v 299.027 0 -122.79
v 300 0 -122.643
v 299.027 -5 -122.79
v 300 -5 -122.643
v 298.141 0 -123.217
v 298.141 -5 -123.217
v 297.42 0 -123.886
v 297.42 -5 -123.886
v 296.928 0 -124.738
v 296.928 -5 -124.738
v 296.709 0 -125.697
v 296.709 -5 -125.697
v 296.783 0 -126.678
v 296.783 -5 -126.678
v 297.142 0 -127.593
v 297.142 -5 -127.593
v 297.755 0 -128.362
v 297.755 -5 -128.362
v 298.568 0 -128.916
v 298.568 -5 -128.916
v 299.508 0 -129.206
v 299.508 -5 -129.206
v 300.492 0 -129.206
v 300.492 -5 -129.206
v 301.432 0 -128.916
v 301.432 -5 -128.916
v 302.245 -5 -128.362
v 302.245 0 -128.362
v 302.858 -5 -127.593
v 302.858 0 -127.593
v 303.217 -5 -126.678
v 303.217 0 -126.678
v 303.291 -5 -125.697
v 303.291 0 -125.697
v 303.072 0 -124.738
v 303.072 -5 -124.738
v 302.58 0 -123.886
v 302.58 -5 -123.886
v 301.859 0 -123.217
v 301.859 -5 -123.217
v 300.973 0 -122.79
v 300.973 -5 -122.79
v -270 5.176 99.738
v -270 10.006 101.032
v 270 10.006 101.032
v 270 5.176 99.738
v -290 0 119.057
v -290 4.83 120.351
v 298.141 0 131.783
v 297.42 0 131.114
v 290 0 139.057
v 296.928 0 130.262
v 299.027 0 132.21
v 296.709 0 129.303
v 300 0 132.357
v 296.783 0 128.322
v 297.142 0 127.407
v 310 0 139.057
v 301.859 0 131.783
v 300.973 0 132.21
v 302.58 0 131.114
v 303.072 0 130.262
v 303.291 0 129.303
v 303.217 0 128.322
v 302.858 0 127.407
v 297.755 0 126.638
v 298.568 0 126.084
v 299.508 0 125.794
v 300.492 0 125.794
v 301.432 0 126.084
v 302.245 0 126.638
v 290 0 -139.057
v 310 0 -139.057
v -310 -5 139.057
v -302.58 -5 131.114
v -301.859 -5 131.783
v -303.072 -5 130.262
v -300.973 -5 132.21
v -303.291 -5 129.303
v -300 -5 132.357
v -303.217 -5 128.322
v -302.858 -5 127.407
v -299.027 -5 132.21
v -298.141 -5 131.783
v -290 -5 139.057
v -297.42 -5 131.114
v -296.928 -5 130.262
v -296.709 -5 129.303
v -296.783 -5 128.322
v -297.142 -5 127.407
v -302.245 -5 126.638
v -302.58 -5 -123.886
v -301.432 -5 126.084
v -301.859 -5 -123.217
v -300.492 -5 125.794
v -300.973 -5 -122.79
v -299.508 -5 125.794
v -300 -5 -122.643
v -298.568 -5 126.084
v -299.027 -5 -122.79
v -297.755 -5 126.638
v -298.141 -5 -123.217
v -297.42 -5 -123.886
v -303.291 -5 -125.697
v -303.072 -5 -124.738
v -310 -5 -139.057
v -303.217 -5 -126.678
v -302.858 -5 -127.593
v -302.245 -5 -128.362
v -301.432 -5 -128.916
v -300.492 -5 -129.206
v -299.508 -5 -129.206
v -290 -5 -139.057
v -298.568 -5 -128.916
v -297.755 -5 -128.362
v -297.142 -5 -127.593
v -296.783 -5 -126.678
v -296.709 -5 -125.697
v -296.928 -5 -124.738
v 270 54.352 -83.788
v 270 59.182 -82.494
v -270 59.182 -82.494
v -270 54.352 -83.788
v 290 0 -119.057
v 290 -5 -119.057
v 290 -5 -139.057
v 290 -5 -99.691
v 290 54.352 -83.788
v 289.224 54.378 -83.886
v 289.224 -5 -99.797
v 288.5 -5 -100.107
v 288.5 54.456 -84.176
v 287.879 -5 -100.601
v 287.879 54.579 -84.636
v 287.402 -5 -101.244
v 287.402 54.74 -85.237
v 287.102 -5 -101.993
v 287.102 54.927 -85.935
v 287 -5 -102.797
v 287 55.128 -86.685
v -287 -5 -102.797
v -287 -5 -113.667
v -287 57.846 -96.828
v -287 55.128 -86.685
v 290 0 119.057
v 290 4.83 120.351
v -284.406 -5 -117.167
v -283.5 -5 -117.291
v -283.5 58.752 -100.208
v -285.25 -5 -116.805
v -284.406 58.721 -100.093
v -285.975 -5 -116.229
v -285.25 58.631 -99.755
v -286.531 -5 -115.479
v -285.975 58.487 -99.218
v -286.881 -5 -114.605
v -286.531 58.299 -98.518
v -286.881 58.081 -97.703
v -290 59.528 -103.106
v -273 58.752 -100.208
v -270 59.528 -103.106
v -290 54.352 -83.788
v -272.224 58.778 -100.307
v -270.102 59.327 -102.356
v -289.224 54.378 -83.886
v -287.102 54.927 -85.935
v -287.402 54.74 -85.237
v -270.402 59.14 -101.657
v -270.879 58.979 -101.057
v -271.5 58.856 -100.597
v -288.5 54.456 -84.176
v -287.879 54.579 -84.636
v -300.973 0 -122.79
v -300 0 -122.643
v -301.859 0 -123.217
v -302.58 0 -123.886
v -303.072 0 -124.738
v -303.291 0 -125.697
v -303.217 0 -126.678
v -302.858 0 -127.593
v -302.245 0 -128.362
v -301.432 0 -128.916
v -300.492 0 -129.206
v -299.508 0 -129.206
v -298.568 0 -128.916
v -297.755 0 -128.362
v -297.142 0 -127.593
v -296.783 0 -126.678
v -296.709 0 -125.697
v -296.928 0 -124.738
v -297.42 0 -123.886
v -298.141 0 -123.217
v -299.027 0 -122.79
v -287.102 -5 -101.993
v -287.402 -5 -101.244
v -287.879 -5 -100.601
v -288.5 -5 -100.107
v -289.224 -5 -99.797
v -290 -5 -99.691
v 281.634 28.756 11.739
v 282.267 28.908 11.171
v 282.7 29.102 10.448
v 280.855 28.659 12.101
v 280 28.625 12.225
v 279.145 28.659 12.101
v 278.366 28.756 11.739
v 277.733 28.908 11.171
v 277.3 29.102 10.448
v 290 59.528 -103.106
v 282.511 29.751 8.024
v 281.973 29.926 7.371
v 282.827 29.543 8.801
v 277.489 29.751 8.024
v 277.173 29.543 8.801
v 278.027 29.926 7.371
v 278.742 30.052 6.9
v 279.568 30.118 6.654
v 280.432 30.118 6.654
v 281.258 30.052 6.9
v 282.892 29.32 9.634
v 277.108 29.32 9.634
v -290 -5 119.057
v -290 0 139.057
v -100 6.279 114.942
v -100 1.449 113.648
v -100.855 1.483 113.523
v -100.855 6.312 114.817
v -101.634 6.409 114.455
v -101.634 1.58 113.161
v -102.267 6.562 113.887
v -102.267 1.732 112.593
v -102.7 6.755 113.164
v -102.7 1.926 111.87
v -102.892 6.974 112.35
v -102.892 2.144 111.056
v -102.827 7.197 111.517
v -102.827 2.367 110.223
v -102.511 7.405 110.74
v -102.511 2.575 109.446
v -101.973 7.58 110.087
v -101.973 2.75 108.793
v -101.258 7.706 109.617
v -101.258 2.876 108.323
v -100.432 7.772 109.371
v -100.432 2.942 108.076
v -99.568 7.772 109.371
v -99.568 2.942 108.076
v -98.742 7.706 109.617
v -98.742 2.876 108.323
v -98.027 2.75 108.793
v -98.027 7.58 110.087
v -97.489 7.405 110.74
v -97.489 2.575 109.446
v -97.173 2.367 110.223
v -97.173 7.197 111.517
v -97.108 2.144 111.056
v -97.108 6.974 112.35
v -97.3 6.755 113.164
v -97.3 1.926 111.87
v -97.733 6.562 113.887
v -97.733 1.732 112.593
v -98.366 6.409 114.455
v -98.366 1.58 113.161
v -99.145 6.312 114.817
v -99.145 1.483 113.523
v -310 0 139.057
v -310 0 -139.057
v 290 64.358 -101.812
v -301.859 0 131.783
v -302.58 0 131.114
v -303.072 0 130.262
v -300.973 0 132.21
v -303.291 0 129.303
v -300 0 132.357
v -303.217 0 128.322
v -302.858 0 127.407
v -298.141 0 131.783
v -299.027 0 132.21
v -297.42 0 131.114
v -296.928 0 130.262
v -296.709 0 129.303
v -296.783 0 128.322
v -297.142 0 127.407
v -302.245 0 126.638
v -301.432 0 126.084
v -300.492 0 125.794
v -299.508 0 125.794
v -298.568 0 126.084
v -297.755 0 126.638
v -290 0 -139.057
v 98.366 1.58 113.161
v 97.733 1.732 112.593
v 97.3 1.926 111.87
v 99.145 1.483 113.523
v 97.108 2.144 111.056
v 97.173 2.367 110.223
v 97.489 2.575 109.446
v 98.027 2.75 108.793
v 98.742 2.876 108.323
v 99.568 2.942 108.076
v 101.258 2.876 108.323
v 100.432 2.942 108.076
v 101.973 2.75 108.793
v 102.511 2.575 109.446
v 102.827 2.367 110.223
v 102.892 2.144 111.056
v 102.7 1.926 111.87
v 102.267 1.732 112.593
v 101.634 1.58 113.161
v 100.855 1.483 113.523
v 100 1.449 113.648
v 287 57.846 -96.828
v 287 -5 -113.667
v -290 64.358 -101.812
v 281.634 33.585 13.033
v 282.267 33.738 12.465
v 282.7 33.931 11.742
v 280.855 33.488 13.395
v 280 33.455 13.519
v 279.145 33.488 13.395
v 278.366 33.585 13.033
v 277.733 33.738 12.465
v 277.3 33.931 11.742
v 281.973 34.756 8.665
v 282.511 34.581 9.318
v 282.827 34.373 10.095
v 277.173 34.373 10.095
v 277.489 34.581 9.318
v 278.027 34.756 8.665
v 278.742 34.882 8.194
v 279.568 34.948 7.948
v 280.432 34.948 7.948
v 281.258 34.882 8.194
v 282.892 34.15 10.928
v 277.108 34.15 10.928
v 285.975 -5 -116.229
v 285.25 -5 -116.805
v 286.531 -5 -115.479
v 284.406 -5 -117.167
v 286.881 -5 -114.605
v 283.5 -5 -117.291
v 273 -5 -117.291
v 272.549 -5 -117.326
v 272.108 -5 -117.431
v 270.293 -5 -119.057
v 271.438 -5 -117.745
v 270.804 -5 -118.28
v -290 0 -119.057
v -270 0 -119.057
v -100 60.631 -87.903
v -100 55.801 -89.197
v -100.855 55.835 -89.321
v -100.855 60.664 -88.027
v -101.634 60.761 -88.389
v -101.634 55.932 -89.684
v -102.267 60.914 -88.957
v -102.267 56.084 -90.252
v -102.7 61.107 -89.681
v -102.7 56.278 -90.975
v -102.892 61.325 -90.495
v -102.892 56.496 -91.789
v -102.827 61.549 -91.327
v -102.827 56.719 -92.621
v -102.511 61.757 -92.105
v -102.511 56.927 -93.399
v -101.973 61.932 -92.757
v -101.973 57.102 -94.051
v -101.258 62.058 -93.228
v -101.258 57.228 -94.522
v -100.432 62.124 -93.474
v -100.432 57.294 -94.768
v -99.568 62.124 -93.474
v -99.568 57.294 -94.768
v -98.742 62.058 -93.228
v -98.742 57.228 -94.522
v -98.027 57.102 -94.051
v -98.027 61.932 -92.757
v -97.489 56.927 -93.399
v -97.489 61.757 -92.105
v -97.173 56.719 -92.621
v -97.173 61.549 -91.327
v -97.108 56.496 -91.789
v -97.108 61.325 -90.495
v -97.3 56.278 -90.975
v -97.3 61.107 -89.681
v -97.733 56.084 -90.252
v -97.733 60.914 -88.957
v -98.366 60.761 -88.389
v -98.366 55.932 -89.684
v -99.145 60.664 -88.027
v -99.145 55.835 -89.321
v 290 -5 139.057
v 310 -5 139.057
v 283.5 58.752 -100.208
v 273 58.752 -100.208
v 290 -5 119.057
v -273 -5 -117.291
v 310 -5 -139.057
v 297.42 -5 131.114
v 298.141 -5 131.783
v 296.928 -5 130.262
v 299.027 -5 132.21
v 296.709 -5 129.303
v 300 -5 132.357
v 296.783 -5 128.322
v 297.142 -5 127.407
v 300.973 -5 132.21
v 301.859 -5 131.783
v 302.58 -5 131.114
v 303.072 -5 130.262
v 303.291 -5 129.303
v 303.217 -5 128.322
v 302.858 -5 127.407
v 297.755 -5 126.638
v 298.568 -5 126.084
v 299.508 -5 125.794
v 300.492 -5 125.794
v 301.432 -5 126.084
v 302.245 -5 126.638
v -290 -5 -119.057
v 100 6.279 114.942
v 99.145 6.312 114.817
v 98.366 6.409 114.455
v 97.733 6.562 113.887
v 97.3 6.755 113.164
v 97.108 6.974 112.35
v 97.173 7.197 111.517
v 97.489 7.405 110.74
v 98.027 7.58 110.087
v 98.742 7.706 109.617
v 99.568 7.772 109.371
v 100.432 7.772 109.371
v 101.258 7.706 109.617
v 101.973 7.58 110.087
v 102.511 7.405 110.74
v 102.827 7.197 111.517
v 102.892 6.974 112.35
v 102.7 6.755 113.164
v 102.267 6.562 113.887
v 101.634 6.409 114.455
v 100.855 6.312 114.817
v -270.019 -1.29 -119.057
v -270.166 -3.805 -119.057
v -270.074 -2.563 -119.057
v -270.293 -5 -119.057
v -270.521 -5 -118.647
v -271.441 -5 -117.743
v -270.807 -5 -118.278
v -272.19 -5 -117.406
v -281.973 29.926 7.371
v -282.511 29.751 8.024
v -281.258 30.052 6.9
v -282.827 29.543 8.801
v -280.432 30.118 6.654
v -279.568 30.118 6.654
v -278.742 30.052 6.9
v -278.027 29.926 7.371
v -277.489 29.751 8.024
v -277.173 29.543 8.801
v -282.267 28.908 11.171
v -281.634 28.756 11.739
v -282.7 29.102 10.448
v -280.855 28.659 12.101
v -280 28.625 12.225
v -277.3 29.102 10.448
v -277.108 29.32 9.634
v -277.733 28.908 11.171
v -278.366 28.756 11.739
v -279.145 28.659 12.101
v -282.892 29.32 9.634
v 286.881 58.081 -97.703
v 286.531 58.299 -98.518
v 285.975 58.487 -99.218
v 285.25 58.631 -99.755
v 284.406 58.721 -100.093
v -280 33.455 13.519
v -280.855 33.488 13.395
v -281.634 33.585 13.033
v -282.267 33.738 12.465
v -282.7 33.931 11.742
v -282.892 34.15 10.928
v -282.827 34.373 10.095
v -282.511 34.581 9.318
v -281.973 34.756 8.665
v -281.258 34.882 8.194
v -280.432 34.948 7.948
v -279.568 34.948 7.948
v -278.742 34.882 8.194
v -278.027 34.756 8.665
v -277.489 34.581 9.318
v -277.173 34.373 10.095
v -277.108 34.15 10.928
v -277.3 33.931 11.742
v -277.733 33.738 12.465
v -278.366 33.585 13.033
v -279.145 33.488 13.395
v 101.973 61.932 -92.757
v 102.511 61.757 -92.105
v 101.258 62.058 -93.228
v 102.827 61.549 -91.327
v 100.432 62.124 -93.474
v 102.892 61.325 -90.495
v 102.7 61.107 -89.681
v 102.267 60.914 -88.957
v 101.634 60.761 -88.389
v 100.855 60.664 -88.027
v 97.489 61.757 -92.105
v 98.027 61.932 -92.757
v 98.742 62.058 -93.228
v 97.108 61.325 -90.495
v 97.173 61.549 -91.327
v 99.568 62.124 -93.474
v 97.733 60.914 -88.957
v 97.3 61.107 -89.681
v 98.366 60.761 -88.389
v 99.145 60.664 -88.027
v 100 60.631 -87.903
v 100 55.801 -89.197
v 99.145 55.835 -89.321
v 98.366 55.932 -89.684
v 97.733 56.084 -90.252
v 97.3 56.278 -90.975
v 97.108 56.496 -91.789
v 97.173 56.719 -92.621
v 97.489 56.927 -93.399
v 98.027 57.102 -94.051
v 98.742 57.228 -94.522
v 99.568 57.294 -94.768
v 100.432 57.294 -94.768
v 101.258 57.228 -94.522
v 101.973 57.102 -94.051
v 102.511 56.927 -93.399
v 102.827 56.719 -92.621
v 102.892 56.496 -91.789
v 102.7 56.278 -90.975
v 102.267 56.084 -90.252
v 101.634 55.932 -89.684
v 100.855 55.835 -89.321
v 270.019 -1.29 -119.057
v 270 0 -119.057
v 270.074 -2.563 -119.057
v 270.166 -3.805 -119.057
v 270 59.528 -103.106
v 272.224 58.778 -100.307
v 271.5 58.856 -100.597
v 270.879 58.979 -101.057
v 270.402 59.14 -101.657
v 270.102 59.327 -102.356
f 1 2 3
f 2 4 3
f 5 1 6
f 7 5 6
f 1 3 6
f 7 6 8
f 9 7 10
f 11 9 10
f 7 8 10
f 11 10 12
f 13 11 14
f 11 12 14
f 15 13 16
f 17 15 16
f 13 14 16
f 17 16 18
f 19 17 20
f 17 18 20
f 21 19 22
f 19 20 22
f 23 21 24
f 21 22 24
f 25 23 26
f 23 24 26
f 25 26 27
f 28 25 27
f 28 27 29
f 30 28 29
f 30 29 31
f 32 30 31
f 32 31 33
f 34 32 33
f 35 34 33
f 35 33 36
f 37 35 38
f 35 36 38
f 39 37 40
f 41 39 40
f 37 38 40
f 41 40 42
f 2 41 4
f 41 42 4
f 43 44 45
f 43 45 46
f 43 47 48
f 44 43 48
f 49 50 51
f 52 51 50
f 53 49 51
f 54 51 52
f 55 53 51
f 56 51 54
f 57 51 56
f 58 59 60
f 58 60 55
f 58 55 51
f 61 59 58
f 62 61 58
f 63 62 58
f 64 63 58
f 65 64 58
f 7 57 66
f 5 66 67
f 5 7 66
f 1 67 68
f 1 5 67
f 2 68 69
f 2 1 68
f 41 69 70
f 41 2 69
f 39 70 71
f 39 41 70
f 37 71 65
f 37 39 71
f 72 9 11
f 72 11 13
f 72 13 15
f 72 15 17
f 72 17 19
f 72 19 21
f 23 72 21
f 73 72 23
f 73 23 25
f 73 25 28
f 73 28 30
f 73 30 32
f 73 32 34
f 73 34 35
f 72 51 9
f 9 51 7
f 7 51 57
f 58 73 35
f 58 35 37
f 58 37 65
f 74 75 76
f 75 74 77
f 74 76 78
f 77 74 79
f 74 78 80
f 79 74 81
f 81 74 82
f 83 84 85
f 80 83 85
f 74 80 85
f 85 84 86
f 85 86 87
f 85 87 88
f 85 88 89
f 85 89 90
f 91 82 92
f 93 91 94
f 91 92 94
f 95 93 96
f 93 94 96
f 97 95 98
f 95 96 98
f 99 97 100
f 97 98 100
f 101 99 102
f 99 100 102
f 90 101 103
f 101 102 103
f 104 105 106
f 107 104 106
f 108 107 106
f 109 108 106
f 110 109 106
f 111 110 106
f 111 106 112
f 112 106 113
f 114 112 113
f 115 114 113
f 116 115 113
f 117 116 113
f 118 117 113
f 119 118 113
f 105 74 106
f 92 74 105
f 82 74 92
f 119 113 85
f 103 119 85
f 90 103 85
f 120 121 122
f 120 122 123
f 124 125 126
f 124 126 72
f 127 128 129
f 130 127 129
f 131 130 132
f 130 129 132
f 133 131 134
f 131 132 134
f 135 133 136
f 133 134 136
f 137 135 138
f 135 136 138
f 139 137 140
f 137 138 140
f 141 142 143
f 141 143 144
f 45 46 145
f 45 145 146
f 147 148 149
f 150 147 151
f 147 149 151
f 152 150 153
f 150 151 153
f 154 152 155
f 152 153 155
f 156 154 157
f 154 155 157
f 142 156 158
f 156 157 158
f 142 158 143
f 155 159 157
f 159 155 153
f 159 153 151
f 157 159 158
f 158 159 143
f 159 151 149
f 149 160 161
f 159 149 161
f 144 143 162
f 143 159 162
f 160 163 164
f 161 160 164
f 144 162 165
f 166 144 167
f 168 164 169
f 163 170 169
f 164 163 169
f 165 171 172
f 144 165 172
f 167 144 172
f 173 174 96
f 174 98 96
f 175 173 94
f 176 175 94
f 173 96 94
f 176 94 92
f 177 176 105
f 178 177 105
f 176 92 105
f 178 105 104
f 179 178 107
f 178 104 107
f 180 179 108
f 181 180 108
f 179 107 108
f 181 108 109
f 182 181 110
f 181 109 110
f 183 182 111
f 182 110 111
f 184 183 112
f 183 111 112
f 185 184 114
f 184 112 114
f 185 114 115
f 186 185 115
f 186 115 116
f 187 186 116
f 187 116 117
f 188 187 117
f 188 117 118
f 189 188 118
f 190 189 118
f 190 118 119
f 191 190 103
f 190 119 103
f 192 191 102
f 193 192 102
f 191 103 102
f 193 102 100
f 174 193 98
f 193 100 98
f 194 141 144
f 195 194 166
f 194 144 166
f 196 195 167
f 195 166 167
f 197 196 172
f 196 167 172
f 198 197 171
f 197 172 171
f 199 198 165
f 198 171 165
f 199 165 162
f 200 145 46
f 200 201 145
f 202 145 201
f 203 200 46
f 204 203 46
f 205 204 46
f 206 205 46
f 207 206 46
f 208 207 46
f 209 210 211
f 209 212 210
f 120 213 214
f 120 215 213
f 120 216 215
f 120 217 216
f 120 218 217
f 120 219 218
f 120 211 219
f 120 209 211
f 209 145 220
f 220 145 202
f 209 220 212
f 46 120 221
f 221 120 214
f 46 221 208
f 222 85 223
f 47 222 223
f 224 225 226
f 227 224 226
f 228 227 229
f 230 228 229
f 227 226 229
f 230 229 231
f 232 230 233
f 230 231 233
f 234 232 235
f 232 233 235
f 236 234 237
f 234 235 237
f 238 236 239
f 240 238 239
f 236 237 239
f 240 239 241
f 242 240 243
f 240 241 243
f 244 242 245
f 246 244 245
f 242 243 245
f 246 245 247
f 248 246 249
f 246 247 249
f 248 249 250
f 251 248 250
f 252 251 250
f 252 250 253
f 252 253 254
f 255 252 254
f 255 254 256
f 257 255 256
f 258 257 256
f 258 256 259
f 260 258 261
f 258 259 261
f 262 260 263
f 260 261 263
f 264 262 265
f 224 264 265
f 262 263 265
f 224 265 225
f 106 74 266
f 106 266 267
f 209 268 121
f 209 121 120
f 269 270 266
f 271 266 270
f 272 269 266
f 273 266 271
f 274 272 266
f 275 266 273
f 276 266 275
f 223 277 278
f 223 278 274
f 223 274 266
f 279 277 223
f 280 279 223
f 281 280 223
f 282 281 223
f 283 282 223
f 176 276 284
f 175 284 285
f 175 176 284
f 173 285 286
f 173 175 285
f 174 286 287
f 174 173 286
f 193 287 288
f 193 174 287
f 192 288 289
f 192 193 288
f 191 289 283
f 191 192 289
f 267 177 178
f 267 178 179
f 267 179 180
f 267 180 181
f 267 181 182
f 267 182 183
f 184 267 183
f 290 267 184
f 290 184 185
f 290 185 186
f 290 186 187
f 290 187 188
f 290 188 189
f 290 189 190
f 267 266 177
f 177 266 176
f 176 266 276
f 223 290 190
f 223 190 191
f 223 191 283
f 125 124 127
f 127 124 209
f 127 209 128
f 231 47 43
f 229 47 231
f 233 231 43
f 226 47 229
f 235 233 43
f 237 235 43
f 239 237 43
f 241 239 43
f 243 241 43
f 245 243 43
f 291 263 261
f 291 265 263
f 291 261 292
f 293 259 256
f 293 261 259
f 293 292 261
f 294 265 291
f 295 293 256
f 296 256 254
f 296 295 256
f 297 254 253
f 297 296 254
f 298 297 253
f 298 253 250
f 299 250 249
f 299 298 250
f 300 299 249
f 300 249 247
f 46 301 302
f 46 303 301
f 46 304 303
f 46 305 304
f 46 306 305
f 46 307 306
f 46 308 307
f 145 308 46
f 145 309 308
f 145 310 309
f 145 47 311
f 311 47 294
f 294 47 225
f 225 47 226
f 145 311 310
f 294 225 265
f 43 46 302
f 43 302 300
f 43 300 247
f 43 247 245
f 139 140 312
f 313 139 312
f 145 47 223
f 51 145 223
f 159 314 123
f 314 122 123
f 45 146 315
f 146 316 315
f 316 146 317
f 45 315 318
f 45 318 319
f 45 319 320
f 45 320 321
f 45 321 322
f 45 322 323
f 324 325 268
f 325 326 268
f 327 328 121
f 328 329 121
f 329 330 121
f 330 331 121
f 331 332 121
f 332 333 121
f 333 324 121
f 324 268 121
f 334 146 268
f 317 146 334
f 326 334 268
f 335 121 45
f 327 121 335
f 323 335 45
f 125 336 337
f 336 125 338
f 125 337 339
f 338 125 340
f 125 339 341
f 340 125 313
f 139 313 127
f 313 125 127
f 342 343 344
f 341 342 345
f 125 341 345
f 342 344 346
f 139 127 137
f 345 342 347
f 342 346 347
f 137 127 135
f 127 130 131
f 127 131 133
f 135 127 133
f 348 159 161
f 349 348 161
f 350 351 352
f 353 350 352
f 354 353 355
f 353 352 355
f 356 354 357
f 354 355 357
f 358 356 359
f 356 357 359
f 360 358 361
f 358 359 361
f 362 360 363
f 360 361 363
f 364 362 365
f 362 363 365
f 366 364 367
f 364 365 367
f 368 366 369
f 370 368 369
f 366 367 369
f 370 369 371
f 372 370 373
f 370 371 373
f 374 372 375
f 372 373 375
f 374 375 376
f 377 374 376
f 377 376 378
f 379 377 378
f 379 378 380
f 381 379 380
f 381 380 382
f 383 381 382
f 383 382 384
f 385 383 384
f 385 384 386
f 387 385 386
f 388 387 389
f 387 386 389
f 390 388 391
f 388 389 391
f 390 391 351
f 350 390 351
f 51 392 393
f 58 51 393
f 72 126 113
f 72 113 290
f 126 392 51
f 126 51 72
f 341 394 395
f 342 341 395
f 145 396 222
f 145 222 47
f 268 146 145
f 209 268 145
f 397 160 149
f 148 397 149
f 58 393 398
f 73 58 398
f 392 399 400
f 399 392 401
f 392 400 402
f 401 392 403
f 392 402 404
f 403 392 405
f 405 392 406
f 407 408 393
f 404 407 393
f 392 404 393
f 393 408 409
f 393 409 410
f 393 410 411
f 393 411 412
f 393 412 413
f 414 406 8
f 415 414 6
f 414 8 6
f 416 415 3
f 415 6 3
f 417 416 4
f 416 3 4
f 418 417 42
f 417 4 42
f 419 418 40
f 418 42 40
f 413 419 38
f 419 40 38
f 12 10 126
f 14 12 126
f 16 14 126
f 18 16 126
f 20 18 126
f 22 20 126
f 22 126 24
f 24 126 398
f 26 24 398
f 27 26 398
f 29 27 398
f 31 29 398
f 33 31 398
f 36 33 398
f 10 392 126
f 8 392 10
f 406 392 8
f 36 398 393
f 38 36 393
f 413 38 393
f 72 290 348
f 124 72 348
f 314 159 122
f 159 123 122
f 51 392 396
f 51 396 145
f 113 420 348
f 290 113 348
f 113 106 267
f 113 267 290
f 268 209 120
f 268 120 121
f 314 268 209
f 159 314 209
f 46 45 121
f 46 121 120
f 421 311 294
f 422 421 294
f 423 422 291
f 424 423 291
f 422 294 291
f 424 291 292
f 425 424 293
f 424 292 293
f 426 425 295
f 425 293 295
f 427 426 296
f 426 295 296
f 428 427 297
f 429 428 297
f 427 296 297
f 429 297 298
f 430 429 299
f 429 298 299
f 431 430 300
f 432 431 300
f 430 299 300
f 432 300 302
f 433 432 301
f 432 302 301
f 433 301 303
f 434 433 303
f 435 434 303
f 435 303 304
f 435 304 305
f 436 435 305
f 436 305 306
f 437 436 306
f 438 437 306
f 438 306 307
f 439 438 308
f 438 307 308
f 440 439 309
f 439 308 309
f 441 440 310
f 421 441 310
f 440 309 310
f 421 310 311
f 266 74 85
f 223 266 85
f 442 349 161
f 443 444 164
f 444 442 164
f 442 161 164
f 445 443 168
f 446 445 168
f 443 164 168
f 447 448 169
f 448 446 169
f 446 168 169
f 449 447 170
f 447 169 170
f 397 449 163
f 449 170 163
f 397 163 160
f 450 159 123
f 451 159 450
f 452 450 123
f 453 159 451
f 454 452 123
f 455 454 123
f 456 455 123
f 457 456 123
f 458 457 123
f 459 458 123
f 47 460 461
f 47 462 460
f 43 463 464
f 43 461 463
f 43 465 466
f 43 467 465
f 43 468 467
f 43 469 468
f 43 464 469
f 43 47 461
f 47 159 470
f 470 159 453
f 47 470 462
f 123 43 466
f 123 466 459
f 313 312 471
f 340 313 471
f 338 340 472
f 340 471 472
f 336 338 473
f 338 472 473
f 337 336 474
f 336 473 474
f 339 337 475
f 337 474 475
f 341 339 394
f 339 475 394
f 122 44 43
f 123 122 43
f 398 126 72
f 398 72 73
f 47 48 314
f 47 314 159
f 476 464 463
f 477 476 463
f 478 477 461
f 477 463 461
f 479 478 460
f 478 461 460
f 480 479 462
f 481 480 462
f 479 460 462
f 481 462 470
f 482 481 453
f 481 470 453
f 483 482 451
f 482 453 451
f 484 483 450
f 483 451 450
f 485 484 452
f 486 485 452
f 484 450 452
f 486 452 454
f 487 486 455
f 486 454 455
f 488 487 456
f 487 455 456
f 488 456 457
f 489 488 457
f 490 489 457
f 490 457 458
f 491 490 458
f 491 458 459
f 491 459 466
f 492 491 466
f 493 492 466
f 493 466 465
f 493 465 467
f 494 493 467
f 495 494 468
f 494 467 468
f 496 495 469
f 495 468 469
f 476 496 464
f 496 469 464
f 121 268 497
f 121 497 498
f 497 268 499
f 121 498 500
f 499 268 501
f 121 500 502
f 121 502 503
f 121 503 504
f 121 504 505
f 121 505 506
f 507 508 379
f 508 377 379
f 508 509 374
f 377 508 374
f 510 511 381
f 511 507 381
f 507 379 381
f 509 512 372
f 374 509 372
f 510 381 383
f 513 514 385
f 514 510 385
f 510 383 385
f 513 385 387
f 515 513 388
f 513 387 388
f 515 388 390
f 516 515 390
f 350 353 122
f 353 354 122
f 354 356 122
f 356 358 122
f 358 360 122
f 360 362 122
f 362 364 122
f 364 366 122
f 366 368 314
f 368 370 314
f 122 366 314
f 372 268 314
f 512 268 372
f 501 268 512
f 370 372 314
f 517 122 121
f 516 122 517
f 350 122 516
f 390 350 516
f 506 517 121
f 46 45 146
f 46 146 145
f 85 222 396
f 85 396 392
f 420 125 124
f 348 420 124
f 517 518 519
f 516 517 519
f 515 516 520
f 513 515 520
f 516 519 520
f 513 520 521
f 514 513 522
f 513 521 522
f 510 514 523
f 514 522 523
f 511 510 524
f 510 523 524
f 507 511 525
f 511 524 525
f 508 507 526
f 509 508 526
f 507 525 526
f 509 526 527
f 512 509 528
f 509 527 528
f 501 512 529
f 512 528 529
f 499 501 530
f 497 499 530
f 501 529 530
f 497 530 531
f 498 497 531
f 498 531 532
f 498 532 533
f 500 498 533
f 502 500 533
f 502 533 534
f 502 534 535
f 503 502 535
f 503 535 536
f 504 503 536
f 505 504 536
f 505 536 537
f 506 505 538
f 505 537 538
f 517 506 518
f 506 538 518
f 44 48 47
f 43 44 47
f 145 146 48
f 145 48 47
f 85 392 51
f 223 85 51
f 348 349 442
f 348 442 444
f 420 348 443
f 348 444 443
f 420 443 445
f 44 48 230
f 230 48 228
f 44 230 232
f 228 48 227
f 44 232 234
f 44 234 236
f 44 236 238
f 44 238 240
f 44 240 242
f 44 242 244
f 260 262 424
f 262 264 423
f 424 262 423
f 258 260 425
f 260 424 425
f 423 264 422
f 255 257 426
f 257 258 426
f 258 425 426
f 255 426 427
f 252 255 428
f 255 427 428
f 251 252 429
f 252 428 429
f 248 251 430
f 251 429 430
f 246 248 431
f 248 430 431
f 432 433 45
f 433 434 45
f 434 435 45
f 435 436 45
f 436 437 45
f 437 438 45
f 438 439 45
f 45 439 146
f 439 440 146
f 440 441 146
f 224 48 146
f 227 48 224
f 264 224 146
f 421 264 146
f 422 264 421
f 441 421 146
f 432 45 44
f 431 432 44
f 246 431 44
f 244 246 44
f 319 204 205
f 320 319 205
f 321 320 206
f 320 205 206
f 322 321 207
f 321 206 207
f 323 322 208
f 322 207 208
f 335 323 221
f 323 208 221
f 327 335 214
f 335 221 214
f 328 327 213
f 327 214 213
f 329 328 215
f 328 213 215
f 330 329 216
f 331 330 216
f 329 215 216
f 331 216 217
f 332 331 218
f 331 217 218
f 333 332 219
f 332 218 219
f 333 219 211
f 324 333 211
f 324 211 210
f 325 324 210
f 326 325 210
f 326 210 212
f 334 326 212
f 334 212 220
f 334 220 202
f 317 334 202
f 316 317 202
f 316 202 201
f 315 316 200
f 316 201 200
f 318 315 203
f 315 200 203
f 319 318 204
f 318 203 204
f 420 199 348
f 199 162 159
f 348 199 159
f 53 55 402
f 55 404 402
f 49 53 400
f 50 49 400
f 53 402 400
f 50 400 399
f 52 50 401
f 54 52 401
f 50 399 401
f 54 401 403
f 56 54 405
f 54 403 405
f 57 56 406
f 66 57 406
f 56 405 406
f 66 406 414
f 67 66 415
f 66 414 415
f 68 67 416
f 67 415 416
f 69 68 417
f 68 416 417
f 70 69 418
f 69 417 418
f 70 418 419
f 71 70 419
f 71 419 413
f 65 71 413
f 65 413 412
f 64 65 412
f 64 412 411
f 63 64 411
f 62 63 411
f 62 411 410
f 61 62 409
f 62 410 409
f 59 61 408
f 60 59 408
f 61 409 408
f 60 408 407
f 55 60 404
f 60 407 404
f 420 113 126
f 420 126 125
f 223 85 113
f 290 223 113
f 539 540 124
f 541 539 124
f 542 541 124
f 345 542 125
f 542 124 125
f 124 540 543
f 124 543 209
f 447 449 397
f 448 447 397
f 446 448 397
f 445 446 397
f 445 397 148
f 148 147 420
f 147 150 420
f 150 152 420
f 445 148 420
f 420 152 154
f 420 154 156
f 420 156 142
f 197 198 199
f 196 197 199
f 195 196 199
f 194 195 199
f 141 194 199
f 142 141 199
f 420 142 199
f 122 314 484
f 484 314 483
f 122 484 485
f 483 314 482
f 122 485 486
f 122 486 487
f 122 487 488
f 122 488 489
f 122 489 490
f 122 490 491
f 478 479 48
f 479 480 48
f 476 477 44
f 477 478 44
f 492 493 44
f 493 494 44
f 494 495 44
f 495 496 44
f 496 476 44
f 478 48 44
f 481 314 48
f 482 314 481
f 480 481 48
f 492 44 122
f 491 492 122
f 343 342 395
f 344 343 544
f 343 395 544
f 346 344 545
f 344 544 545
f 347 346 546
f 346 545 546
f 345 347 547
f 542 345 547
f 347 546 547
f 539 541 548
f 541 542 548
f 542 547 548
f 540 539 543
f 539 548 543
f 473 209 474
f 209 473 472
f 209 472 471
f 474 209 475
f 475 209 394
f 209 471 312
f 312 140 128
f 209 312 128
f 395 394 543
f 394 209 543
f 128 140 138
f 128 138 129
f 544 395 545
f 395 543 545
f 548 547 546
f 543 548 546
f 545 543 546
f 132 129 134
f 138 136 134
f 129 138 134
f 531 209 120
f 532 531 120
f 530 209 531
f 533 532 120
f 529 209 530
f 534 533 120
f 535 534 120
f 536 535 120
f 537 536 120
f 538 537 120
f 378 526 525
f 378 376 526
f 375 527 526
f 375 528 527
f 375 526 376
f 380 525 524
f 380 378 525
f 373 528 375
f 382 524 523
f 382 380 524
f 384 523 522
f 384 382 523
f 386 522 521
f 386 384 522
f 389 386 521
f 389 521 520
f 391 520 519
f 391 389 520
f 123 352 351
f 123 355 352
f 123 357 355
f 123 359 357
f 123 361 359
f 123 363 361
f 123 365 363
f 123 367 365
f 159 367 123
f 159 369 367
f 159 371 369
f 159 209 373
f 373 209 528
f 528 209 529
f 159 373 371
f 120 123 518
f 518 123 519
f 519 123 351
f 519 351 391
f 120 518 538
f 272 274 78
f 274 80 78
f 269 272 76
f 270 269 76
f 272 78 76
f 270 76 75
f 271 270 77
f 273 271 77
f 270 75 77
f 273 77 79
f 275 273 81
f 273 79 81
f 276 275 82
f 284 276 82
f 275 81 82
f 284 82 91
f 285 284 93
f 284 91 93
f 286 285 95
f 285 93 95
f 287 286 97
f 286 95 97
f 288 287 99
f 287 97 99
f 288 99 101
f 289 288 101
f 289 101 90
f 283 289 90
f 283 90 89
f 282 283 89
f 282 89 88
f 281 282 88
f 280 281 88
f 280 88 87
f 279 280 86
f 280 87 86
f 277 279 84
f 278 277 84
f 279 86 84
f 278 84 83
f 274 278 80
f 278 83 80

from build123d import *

# Parameters (mm, degrees)
TUBE_RECTANGULAR_50_X_30_X_2_6_46_DEPTH      = 251.615528128
TUBE_RECTANGULAR_50_X_30_X_2_6_46_DEPTH_BACK = 21.615528128
SKETCH1_W                                    = 20
SKETCH1_H                                    = 5
SKETCH1_ON_SEGMENT_2_W                       = 20
SKETCH1_ON_SEGMENT_2_H                       = 5
TUBE_RECTANGULAR_50_X_30_X_2_6_46_3_DEPTH    = 623.231056256
SKETCH1_ON_SEGMENT_3_W                       = 20
SKETCH1_ON_SEGMENT_3_H                       = 5
TUBE_RECTANGULAR_50_X_30_X_2_6_46_5_DEPTH    = 273.231056256
SKETCH1_ON_SEGMENT_4_W                       = 20
SKETCH1_ON_SEGMENT_4_H                       = 5
TUBE_RECTANGULAR_50_X_30_X_2_6_46_7_DEPTH    = 623.231056256
L_ANGLE_EQUAL_20X20X3_13_DEPTH               = 61.628314259
L_ANGLE_EQUAL_20X20X3_13_2_DEPTH             = 61.628314259
TUBE_START                                   = -5
TUBE_RECTANGULAR_50_X_30_X_2_6_47_OUTL_W     = 20
TUBE_RECTANGULAR_50_X_30_X_2_6_47_OUTL_H     = 278.113521494
TUBE_RECTANGULAR_50_X_30_X_2_6_47_DEPTH      = 5
TUBE_START_2                                 = -290
TUBE_RECTANGULAR_50_X_30_X_2_6_47_2_OU_W     = 5
TUBE_RECTANGULAR_50_X_30_X_2_6_47_2_OU_H     = 20
TUBE_RECTANGULAR_50_X_30_X_2_6_47_2_DEPTH    = 580
TUBE_RECTANGULAR_50_X_30_X_2_6_47_3_OU_W     = 5
TUBE_RECTANGULAR_50_X_30_X_2_6_47_3_OU_H     = 20
TUBE_RECTANGULAR_50_X_30_X_2_6_47_3_DEPTH    = 580
TUBE_RECTANGULAR_50_X_30_X_2_6_47_4_OU_W     = 20
TUBE_RECTANGULAR_50_X_30_X_2_6_47_4_OU_H     = 278.113521494
TUBE_RECTANGULAR_50_X_30_X_2_6_47_4_DEPTH    = 5
BODY_START                                   = 61.628314241
BODY_5_RUN_ON_DEPTH                          = 5.176381
BODY_START_2                                 = 61.62831424
BODY_6_RUN_ON_DEPTH                          = 5.176381
SKETCH20_W                                   = 3.3
SKETCH20_H                                   = 5
M6_CLEARANCE_HOLE1_AT_2_COUNT                = 2
M6_CLEARANCE_HOLE1_AT_2_PITCH                = 255
M6_CLEARANCE_HOLE1_AT_3_COUNT                = 2
M6_CLEARANCE_HOLE1_AT_3_PITCH                = 651.939414363
M6_CLEARANCE_HOLE1_AT_4_COUNT                = 2
M6_CLEARANCE_HOLE1_AT_4_PITCH                = 600
ESQUISSE2_W                                  = 2.9
ESQUISSE2_H                                  = 76.634324293
D_GAGEMENT_M51_AT_2_COUNT                    = 2
D_GAGEMENT_M51_AT_2_PITCH                    = 290
D_GAGEMENT_M51_AT_3_COUNT                    = 2
D_GAGEMENT_M51_AT_3_PITCH                    = 210
D_GAGEMENT_M51_AT_4_COUNT                    = 2
D_GAGEMENT_M51_AT_4_PITCH                    = 208.386659842
D_GAGEMENT_M51_AT_5_COUNT                    = 2
D_GAGEMENT_M51_AT_5_PITCH                    = 394.239774756
D_GAGEMENT_M51_AT_6_COUNT                    = 2
D_GAGEMENT_M51_AT_6_PITCH                    = 200


# Read off the part's stored shape, not the designer's step: Tube (rectangular) 50 X 30 X 2.6(47)
with BuildPart() as part:
    # Sketch1 → Tube (rectangular) 50 X 30 X 2.6(46) (new, two sides: drawn at the far end of the back side and taken through both)
    with BuildSketch(Plane(origin=(-280, 2.414814566, 119.70380836), x_dir=(1, 0, 0), z_dir=(1.2067641572012591e-15, 0.25881904510252146, -0.9659258262890681)).offset(-TUBE_RECTANGULAR_50_X_30_X_2_6_46_DEPTH_BACK)):
        Rectangle(SKETCH1_W, SKETCH1_H)
    extrude(amount=TUBE_RECTANGULAR_50_X_30_X_2_6_46_DEPTH + TUBE_RECTANGULAR_50_X_30_X_2_6_46_DEPTH_BACK)

    # Tube (rectangular) 50 X 30 X 2.6(46) mitr
    split(bisect_by=Plane(origin=(-290, 0, 119.056760747), x_dir=(-0.250562807, -0.968100346, 0), z_dir=(-0.707106781, 0.183012702, -0.683012702)), keep=Keep.TOP)

    # Tube (rectangular) 50 X 30 X 2.6(46)  2
    split(bisect_by=Plane(origin=(-290, 59.528380374, -103.106179299), x_dir=(0.250562807, -0.968100346, 0), z_dir=(-0.707106781, -0.183012702, 0.683012702)), keep=Keep.TOP)


with BuildPart() as body_2:
    # Sketch1 on segment 2 (carried to segment 2) → Tube (rectangular) 50 X 30 X 2.6(46)  3 (new body)
    with BuildSketch(Plane(origin=(-311.615528128, 59.355004488, -92.799873424), x_dir=(0, -0.258819045, 0.965925826), z_dir=(1, 0, 0))):
        Rectangle(SKETCH1_ON_SEGMENT_2_W, SKETCH1_ON_SEGMENT_2_H)
    extrude(amount=TUBE_RECTANGULAR_50_X_30_X_2_6_46_3_DEPTH)

    # Tube _rectangular_ 50 X 30 X 2.6_46 3 mi
    split(bisect_by=Plane(origin=(-290, 59.528380374, -103.106179299), x_dir=(-0.250562807, 0.968100346, 0), z_dir=(0.707106781, 0.183012702, -0.683012702)), keep=Keep.TOP)

    # Tube (rectangular) 50 X 30 X 2.6(46)  4
    split(bisect_by=Plane(origin=(290, 59.528380374, -103.106179299), x_dir=(-0.250562807, -0.968100346, 0), z_dir=(-0.707106781, 0.183012702, -0.683012702)), keep=Keep.TOP)


with BuildPart() as body_3:
    # Sketch1 on segment 3 (carried to segment 3) → Tube (rectangular) 50 X 30 X 2.6(46)  5 (new body)
    with BuildSketch(Plane(origin=(280, 67.537705289, -123.338128554), x_dir=(-1, 0, 0), z_dir=(0, -0.258819045, 0.965925826))):
        Rectangle(SKETCH1_ON_SEGMENT_3_W, SKETCH1_ON_SEGMENT_3_H)
    extrude(amount=TUBE_RECTANGULAR_50_X_30_X_2_6_46_5_DEPTH)

    # Tube _rectangular_ 50 X 30 X 2.6_46 5 mi
    split(bisect_by=Plane(origin=(290, 59.528380374, -103.106179299), x_dir=(0.250562807, 0.968100346, 0), z_dir=(0.707106781, -0.183012702, 0.683012702)), keep=Keep.TOP)

    # Tube (rectangular) 50 X 30 X 2.6(46)  6
    split(bisect_by=Plane(origin=(290, 0, 119.056760747), x_dir=(-0.250562807, 0.968100346, 0), z_dir=(0.707106781, 0.183012702, -0.683012702)), keep=Keep.TOP)


with BuildPart() as body_4:
    # Sketch1 on segment 4 (carried to segment 4) → Tube (rectangular) 50 X 30 X 2.6(46)  7 (new body)
    with BuildSketch(Plane(origin=(311.615528128, 5.003005017, 110.044550097), x_dir=(0, 0.258819045, -0.965925826), z_dir=(-1, 0, 0))):
        Rectangle(SKETCH1_ON_SEGMENT_4_W, SKETCH1_ON_SEGMENT_4_H)
    extrude(amount=TUBE_RECTANGULAR_50_X_30_X_2_6_46_7_DEPTH)

    # Tube _rectangular_ 50 X 30 X 2.6_46 7 mi
    split(bisect_by=Plane(origin=(-290, 0, 119.056760747), x_dir=(0.250562807, 0.968100346, 0), z_dir=(0.707106781, -0.183012702, 0.683012702)), keep=Keep.TOP)

    # Tube (rectangular) 50 X 30 X 2.6(46)  8
    split(bisect_by=Plane(origin=(290, 0, 119.056760747), x_dir=(0.250562807, -0.968100346, 0), z_dir=(-0.707106781, -0.183012702, 0.683012702)), keep=Keep.TOP)

    # Esquisse2 → Dégagement M51 (revolve, cut)
    with BuildSketch(Plane(origin=(100, 7.029591015, 112.140486449), x_dir=(0, -0.2588190451025213, 0.9659258262890682), z_dir=(1, 0, 0))):
        with Locations((1.45, 38.317162147)):
            Rectangle(ESQUISSE2_W, ESQUISSE2_H)
    d_gagement_m51 = revolve(axis=Axis((100, 13.163220012, 113.783987386), (-9.20037838079571e-15, -0.9659258262890682, -0.25881904510252135)), mode=Mode.SUBTRACT)

    # Dégagement M51 at 6: Dégagement M51 ×2
    with Locations(*[(-i * D_GAGEMENT_M51_AT_6_PITCH, 0, 0) for i in range(1, D_GAGEMENT_M51_AT_6_COUNT)]):
        add(d_gagement_m51, mode=Mode.SUBTRACT)


with BuildPart() as body_5:
    # Sketch13 → L angle (equal) 20X20X3(13) (new body)
    with BuildSketch(Plane(origin=(-290, 59.528380374, -103.106179299), x_dir=(1, 0, 0), z_dir=(0, -0.9659258262890681, -0.25881904510252174))):
        with BuildLine():
            Line((0, 20), (0, 0))
            Line((0, 0), (20, 0))
            ThreePointArc((20, 0), (19.121320344, 2.121320344), (17, 3))
            Line((17, 3), (6.5, 3))
            ThreePointArc((6.5, 3), (4.025126266, 4.025126266), (3, 6.5))
            Line((3, 6.5), (3, 17))
            ThreePointArc((3, 17), (2.121320344, 19.121320344), (0, 20))
        make_face()
    extrude(amount=L_ANGLE_EQUAL_20X20X3_13_DEPTH)

    # Sketch13 → body 5 run on (add)
    with BuildSketch(Plane(origin=(-290, 59.528380374, -103.106179299), x_dir=(1, 0, 0), z_dir=(0, -0.9659258262890681, -0.25881904510252174)).offset(BODY_START)):
        with BuildLine():
            Line((0, 20), (0, 0))
            Line((0, 0), (20, 0))
            ThreePointArc((20, 0), (19.121320344, 2.121320344), (17, 3))
            Line((17, 3), (6.5, 3))
            ThreePointArc((6.5, 3), (4.025126266, 4.025126266), (3, 6.5))
            Line((3, 6.5), (3, 17))
            ThreePointArc((3, 17), (2.121320344, 19.121320344), (0, 20))
        make_face()
    extrude(amount=BODY_5_RUN_ON_DEPTH)

    # Trim_Extend3 2
    split(bisect_by=Plane(origin=(-300, -5, 0), x_dir=(-1, 0, 0), z_dir=(0, 1, 0)), keep=Keep.TOP)

    # Trim/Extend5
    split(bisect_by=Plane(origin=(0, -2.5, -119.056760747), x_dir=(0, -1, 0), z_dir=(0, 0, 1)), keep=Keep.TOP)


with BuildPart() as body_6:
    # Sketch13 on segment 2 (carried to segment 2) → L angle _equal_ 20X20X3_13 2 (new body)
    with BuildSketch(Plane(origin=(290, 59.528380374, -103.106179299), x_dir=(0, -0.258819045, 0.965925826), z_dir=(0, -0.965925826, -0.258819045))):
        with BuildLine():
            Line((0, 20), (0, 0))
            Line((0, 0), (20, 0))
            ThreePointArc((20, 0), (19.121320344, 2.121320344), (17, 3))
            Line((17, 3), (6.5, 3))
            ThreePointArc((6.5, 3), (4.025126266, 4.025126266), (3, 6.5))
            Line((3, 6.5), (3, 17))
            ThreePointArc((3, 17), (2.121320344, 19.121320344), (0, 20))
        make_face()
    extrude(amount=L_ANGLE_EQUAL_20X20X3_13_2_DEPTH)

    # Sketch13 on segment 2 (carried to segment 2) → body 6 run on (add)
    with BuildSketch(Plane(origin=(290, 59.528380374, -103.106179299), x_dir=(0, -0.258819045, 0.965925826), z_dir=(0, -0.965925826, -0.258819045)).offset(BODY_START_2)):
        with BuildLine():
            Line((0, 20), (0, 0))
            Line((0, 0), (20, 0))
            ThreePointArc((20, 0), (19.121320344, 2.121320344), (17, 3))
            Line((17, 3), (6.5, 3))
            ThreePointArc((6.5, 3), (4.025126266, 4.025126266), (3, 6.5))
            Line((3, 6.5), (3, 17))
            ThreePointArc((3, 17), (2.121320344, 19.121320344), (0, 20))
        make_face()
    extrude(amount=BODY_6_RUN_ON_DEPTH)

    # Trim_Extend3 2
    split(bisect_by=Plane(origin=(-300, -5, 0), x_dir=(-1, 0, 0), z_dir=(0, 1, 0)), keep=Keep.TOP)

    # Trim/Extend5
    split(bisect_by=Plane(origin=(0, -2.5, -119.056760747), x_dir=(0, -1, 0), z_dir=(0, 0, 1)), keep=Keep.TOP)


with BuildPart() as body_7:
    # Tube (rectangular) 50 X 30 X 2.6(47) outl → Tube (rectangular) 50 X 30 X 2.6(47) (new body)
    with BuildSketch(Plane(origin=(0, 0, 0), x_dir=(1, 0, 0), z_dir=(0, 1, 0)).offset(TUBE_START)):
        with Locations((-300, 0)):
            Rectangle(TUBE_RECTANGULAR_50_X_30_X_2_6_47_OUTL_W, TUBE_RECTANGULAR_50_X_30_X_2_6_47_OUTL_H)
    extrude(amount=TUBE_RECTANGULAR_50_X_30_X_2_6_47_DEPTH)


with BuildPart() as body_8:
    # Tube _rectangular_ 50 X 30 X 2.6_47 2 ou → Tube _rectangular_ 50 X 30 X 2.6_47 2 (new body)
    with BuildSketch(Plane.YZ.offset(TUBE_START_2)):
        with Locations((-2.5, 129.056760747)):
            Rectangle(TUBE_RECTANGULAR_50_X_30_X_2_6_47_2_OU_W, TUBE_RECTANGULAR_50_X_30_X_2_6_47_2_OU_H)
    extrude(amount=TUBE_RECTANGULAR_50_X_30_X_2_6_47_2_DEPTH)


with BuildPart() as body_9:
    # Tube _rectangular_ 50 X 30 X 2.6_47 3 ou → Tube _rectangular_ 50 X 30 X 2.6_47 3 (new body)
    with BuildSketch(Plane.YZ.offset(TUBE_START_2)):
        with Locations((-2.5, -129.056760747)):
            Rectangle(TUBE_RECTANGULAR_50_X_30_X_2_6_47_3_OU_W, TUBE_RECTANGULAR_50_X_30_X_2_6_47_3_OU_H)
    extrude(amount=TUBE_RECTANGULAR_50_X_30_X_2_6_47_3_DEPTH)


with BuildPart() as body_10:
    # Tube _rectangular_ 50 X 30 X 2.6_47 4 ou → Tube _rectangular_ 50 X 30 X 2.6_47 4 (new body)
    with BuildSketch(Plane(origin=(0, 0, 0), x_dir=(1, 0, 0), z_dir=(0, 1, 0)).offset(TUBE_START)):
        with Locations((300, 0)):
            Rectangle(TUBE_RECTANGULAR_50_X_30_X_2_6_47_4_OU_W, TUBE_RECTANGULAR_50_X_30_X_2_6_47_4_OU_H)
    extrude(amount=TUBE_RECTANGULAR_50_X_30_X_2_6_47_4_DEPTH)

    # Sketch20 → M6 Clearance Hole1 (revolve, cut)
    with BuildSketch(Plane(origin=(300, 0, -125.943239253), x_dir=(0, 0, 1), z_dir=(1, 0, 0))):
        with Locations((1.65, 2.5)):
            Rectangle(SKETCH20_W, SKETCH20_H)
    m6_clearance_hole1 = revolve(axis=Axis((300, 6.35, -125.943239253), (0, -1, 0)), mode=Mode.SUBTRACT)

    # M6 Clearance Hole1 at 2: M6 Clearance Hole1 ×2
    with Locations(*[(0, 0, i * M6_CLEARANCE_HOLE1_AT_2_PITCH) for i in range(1, M6_CLEARANCE_HOLE1_AT_2_COUNT)]):
        add(m6_clearance_hole1, mode=Mode.SUBTRACT)


with BuildPart() as body_7_1:
    add(body_7.part)

    # M6 Clearance Hole1 at 3: M6 Clearance Hole1 ×2
    with Locations(*[Vector(-0.9203309184584745, 9.61147403107494e-15, 0.3911406403448521) * (i * M6_CLEARANCE_HOLE1_AT_3_PITCH) for i in range(1, M6_CLEARANCE_HOLE1_AT_3_COUNT)]):
        add(m6_clearance_hole1, mode=Mode.SUBTRACT)

    # M6 Clearance Hole1 at 4: M6 Clearance Hole1 ×2
    with Locations(*[(-i * M6_CLEARANCE_HOLE1_AT_4_PITCH, 0, 0) for i in range(1, M6_CLEARANCE_HOLE1_AT_4_COUNT)]):
        add(m6_clearance_hole1, mode=Mode.SUBTRACT)


with BuildPart() as body_2_1:
    add(body_2.part)

    # Dégagement M51 at 2: Dégagement M51 ×2
    with Locations(*[Vector(-0.6896551724137929, 0.18742068783286647, -0.6994635293817376) * (i * D_GAGEMENT_M51_AT_2_PITCH) for i in range(1, D_GAGEMENT_M51_AT_2_COUNT)]):
        add(d_gagement_m51, mode=Mode.SUBTRACT)

    # Dégagement M51 at 3: Dégagement M51 ×2
    with Locations(*[Vector(-1.887261657944815e-15, 0.2588190451025214, -0.9659258262890681) * (i * D_GAGEMENT_M51_AT_3_PITCH) for i in range(1, D_GAGEMENT_M51_AT_3_COUNT)]):
        add(d_gagement_m51, mode=Mode.SUBTRACT)


with BuildPart() as body_3_1:
    add(body_3.part)

    # Dégagement M51 at 4: Dégagement M51 ×2
    with Locations(*[Vector(0.8637789008984335, 0.1304114176809645, -0.4867020366724752) * (i * D_GAGEMENT_M51_AT_4_PITCH) for i in range(1, D_GAGEMENT_M51_AT_4_COUNT)]):
        add(d_gagement_m51, mode=Mode.SUBTRACT)


with BuildPart() as part_1:
    add(part.part)

    # Dégagement M51 at 5: Dégagement M51 ×2
    with Locations(*[Vector(-0.963880420829616, 0.06893266858362566, -0.2572602214553631) * (i * D_GAGEMENT_M51_AT_5_PITCH) for i in range(1, D_GAGEMENT_M51_AT_5_COUNT)]):
        add(d_gagement_m51, mode=Mode.SUBTRACT)


solid = Compound([body_4.part, body_5.part, body_6.part, body_8.part, body_9.part, body_10.part, body_7_1.part, body_2_1.part, body_3_1.part, part_1.part])
